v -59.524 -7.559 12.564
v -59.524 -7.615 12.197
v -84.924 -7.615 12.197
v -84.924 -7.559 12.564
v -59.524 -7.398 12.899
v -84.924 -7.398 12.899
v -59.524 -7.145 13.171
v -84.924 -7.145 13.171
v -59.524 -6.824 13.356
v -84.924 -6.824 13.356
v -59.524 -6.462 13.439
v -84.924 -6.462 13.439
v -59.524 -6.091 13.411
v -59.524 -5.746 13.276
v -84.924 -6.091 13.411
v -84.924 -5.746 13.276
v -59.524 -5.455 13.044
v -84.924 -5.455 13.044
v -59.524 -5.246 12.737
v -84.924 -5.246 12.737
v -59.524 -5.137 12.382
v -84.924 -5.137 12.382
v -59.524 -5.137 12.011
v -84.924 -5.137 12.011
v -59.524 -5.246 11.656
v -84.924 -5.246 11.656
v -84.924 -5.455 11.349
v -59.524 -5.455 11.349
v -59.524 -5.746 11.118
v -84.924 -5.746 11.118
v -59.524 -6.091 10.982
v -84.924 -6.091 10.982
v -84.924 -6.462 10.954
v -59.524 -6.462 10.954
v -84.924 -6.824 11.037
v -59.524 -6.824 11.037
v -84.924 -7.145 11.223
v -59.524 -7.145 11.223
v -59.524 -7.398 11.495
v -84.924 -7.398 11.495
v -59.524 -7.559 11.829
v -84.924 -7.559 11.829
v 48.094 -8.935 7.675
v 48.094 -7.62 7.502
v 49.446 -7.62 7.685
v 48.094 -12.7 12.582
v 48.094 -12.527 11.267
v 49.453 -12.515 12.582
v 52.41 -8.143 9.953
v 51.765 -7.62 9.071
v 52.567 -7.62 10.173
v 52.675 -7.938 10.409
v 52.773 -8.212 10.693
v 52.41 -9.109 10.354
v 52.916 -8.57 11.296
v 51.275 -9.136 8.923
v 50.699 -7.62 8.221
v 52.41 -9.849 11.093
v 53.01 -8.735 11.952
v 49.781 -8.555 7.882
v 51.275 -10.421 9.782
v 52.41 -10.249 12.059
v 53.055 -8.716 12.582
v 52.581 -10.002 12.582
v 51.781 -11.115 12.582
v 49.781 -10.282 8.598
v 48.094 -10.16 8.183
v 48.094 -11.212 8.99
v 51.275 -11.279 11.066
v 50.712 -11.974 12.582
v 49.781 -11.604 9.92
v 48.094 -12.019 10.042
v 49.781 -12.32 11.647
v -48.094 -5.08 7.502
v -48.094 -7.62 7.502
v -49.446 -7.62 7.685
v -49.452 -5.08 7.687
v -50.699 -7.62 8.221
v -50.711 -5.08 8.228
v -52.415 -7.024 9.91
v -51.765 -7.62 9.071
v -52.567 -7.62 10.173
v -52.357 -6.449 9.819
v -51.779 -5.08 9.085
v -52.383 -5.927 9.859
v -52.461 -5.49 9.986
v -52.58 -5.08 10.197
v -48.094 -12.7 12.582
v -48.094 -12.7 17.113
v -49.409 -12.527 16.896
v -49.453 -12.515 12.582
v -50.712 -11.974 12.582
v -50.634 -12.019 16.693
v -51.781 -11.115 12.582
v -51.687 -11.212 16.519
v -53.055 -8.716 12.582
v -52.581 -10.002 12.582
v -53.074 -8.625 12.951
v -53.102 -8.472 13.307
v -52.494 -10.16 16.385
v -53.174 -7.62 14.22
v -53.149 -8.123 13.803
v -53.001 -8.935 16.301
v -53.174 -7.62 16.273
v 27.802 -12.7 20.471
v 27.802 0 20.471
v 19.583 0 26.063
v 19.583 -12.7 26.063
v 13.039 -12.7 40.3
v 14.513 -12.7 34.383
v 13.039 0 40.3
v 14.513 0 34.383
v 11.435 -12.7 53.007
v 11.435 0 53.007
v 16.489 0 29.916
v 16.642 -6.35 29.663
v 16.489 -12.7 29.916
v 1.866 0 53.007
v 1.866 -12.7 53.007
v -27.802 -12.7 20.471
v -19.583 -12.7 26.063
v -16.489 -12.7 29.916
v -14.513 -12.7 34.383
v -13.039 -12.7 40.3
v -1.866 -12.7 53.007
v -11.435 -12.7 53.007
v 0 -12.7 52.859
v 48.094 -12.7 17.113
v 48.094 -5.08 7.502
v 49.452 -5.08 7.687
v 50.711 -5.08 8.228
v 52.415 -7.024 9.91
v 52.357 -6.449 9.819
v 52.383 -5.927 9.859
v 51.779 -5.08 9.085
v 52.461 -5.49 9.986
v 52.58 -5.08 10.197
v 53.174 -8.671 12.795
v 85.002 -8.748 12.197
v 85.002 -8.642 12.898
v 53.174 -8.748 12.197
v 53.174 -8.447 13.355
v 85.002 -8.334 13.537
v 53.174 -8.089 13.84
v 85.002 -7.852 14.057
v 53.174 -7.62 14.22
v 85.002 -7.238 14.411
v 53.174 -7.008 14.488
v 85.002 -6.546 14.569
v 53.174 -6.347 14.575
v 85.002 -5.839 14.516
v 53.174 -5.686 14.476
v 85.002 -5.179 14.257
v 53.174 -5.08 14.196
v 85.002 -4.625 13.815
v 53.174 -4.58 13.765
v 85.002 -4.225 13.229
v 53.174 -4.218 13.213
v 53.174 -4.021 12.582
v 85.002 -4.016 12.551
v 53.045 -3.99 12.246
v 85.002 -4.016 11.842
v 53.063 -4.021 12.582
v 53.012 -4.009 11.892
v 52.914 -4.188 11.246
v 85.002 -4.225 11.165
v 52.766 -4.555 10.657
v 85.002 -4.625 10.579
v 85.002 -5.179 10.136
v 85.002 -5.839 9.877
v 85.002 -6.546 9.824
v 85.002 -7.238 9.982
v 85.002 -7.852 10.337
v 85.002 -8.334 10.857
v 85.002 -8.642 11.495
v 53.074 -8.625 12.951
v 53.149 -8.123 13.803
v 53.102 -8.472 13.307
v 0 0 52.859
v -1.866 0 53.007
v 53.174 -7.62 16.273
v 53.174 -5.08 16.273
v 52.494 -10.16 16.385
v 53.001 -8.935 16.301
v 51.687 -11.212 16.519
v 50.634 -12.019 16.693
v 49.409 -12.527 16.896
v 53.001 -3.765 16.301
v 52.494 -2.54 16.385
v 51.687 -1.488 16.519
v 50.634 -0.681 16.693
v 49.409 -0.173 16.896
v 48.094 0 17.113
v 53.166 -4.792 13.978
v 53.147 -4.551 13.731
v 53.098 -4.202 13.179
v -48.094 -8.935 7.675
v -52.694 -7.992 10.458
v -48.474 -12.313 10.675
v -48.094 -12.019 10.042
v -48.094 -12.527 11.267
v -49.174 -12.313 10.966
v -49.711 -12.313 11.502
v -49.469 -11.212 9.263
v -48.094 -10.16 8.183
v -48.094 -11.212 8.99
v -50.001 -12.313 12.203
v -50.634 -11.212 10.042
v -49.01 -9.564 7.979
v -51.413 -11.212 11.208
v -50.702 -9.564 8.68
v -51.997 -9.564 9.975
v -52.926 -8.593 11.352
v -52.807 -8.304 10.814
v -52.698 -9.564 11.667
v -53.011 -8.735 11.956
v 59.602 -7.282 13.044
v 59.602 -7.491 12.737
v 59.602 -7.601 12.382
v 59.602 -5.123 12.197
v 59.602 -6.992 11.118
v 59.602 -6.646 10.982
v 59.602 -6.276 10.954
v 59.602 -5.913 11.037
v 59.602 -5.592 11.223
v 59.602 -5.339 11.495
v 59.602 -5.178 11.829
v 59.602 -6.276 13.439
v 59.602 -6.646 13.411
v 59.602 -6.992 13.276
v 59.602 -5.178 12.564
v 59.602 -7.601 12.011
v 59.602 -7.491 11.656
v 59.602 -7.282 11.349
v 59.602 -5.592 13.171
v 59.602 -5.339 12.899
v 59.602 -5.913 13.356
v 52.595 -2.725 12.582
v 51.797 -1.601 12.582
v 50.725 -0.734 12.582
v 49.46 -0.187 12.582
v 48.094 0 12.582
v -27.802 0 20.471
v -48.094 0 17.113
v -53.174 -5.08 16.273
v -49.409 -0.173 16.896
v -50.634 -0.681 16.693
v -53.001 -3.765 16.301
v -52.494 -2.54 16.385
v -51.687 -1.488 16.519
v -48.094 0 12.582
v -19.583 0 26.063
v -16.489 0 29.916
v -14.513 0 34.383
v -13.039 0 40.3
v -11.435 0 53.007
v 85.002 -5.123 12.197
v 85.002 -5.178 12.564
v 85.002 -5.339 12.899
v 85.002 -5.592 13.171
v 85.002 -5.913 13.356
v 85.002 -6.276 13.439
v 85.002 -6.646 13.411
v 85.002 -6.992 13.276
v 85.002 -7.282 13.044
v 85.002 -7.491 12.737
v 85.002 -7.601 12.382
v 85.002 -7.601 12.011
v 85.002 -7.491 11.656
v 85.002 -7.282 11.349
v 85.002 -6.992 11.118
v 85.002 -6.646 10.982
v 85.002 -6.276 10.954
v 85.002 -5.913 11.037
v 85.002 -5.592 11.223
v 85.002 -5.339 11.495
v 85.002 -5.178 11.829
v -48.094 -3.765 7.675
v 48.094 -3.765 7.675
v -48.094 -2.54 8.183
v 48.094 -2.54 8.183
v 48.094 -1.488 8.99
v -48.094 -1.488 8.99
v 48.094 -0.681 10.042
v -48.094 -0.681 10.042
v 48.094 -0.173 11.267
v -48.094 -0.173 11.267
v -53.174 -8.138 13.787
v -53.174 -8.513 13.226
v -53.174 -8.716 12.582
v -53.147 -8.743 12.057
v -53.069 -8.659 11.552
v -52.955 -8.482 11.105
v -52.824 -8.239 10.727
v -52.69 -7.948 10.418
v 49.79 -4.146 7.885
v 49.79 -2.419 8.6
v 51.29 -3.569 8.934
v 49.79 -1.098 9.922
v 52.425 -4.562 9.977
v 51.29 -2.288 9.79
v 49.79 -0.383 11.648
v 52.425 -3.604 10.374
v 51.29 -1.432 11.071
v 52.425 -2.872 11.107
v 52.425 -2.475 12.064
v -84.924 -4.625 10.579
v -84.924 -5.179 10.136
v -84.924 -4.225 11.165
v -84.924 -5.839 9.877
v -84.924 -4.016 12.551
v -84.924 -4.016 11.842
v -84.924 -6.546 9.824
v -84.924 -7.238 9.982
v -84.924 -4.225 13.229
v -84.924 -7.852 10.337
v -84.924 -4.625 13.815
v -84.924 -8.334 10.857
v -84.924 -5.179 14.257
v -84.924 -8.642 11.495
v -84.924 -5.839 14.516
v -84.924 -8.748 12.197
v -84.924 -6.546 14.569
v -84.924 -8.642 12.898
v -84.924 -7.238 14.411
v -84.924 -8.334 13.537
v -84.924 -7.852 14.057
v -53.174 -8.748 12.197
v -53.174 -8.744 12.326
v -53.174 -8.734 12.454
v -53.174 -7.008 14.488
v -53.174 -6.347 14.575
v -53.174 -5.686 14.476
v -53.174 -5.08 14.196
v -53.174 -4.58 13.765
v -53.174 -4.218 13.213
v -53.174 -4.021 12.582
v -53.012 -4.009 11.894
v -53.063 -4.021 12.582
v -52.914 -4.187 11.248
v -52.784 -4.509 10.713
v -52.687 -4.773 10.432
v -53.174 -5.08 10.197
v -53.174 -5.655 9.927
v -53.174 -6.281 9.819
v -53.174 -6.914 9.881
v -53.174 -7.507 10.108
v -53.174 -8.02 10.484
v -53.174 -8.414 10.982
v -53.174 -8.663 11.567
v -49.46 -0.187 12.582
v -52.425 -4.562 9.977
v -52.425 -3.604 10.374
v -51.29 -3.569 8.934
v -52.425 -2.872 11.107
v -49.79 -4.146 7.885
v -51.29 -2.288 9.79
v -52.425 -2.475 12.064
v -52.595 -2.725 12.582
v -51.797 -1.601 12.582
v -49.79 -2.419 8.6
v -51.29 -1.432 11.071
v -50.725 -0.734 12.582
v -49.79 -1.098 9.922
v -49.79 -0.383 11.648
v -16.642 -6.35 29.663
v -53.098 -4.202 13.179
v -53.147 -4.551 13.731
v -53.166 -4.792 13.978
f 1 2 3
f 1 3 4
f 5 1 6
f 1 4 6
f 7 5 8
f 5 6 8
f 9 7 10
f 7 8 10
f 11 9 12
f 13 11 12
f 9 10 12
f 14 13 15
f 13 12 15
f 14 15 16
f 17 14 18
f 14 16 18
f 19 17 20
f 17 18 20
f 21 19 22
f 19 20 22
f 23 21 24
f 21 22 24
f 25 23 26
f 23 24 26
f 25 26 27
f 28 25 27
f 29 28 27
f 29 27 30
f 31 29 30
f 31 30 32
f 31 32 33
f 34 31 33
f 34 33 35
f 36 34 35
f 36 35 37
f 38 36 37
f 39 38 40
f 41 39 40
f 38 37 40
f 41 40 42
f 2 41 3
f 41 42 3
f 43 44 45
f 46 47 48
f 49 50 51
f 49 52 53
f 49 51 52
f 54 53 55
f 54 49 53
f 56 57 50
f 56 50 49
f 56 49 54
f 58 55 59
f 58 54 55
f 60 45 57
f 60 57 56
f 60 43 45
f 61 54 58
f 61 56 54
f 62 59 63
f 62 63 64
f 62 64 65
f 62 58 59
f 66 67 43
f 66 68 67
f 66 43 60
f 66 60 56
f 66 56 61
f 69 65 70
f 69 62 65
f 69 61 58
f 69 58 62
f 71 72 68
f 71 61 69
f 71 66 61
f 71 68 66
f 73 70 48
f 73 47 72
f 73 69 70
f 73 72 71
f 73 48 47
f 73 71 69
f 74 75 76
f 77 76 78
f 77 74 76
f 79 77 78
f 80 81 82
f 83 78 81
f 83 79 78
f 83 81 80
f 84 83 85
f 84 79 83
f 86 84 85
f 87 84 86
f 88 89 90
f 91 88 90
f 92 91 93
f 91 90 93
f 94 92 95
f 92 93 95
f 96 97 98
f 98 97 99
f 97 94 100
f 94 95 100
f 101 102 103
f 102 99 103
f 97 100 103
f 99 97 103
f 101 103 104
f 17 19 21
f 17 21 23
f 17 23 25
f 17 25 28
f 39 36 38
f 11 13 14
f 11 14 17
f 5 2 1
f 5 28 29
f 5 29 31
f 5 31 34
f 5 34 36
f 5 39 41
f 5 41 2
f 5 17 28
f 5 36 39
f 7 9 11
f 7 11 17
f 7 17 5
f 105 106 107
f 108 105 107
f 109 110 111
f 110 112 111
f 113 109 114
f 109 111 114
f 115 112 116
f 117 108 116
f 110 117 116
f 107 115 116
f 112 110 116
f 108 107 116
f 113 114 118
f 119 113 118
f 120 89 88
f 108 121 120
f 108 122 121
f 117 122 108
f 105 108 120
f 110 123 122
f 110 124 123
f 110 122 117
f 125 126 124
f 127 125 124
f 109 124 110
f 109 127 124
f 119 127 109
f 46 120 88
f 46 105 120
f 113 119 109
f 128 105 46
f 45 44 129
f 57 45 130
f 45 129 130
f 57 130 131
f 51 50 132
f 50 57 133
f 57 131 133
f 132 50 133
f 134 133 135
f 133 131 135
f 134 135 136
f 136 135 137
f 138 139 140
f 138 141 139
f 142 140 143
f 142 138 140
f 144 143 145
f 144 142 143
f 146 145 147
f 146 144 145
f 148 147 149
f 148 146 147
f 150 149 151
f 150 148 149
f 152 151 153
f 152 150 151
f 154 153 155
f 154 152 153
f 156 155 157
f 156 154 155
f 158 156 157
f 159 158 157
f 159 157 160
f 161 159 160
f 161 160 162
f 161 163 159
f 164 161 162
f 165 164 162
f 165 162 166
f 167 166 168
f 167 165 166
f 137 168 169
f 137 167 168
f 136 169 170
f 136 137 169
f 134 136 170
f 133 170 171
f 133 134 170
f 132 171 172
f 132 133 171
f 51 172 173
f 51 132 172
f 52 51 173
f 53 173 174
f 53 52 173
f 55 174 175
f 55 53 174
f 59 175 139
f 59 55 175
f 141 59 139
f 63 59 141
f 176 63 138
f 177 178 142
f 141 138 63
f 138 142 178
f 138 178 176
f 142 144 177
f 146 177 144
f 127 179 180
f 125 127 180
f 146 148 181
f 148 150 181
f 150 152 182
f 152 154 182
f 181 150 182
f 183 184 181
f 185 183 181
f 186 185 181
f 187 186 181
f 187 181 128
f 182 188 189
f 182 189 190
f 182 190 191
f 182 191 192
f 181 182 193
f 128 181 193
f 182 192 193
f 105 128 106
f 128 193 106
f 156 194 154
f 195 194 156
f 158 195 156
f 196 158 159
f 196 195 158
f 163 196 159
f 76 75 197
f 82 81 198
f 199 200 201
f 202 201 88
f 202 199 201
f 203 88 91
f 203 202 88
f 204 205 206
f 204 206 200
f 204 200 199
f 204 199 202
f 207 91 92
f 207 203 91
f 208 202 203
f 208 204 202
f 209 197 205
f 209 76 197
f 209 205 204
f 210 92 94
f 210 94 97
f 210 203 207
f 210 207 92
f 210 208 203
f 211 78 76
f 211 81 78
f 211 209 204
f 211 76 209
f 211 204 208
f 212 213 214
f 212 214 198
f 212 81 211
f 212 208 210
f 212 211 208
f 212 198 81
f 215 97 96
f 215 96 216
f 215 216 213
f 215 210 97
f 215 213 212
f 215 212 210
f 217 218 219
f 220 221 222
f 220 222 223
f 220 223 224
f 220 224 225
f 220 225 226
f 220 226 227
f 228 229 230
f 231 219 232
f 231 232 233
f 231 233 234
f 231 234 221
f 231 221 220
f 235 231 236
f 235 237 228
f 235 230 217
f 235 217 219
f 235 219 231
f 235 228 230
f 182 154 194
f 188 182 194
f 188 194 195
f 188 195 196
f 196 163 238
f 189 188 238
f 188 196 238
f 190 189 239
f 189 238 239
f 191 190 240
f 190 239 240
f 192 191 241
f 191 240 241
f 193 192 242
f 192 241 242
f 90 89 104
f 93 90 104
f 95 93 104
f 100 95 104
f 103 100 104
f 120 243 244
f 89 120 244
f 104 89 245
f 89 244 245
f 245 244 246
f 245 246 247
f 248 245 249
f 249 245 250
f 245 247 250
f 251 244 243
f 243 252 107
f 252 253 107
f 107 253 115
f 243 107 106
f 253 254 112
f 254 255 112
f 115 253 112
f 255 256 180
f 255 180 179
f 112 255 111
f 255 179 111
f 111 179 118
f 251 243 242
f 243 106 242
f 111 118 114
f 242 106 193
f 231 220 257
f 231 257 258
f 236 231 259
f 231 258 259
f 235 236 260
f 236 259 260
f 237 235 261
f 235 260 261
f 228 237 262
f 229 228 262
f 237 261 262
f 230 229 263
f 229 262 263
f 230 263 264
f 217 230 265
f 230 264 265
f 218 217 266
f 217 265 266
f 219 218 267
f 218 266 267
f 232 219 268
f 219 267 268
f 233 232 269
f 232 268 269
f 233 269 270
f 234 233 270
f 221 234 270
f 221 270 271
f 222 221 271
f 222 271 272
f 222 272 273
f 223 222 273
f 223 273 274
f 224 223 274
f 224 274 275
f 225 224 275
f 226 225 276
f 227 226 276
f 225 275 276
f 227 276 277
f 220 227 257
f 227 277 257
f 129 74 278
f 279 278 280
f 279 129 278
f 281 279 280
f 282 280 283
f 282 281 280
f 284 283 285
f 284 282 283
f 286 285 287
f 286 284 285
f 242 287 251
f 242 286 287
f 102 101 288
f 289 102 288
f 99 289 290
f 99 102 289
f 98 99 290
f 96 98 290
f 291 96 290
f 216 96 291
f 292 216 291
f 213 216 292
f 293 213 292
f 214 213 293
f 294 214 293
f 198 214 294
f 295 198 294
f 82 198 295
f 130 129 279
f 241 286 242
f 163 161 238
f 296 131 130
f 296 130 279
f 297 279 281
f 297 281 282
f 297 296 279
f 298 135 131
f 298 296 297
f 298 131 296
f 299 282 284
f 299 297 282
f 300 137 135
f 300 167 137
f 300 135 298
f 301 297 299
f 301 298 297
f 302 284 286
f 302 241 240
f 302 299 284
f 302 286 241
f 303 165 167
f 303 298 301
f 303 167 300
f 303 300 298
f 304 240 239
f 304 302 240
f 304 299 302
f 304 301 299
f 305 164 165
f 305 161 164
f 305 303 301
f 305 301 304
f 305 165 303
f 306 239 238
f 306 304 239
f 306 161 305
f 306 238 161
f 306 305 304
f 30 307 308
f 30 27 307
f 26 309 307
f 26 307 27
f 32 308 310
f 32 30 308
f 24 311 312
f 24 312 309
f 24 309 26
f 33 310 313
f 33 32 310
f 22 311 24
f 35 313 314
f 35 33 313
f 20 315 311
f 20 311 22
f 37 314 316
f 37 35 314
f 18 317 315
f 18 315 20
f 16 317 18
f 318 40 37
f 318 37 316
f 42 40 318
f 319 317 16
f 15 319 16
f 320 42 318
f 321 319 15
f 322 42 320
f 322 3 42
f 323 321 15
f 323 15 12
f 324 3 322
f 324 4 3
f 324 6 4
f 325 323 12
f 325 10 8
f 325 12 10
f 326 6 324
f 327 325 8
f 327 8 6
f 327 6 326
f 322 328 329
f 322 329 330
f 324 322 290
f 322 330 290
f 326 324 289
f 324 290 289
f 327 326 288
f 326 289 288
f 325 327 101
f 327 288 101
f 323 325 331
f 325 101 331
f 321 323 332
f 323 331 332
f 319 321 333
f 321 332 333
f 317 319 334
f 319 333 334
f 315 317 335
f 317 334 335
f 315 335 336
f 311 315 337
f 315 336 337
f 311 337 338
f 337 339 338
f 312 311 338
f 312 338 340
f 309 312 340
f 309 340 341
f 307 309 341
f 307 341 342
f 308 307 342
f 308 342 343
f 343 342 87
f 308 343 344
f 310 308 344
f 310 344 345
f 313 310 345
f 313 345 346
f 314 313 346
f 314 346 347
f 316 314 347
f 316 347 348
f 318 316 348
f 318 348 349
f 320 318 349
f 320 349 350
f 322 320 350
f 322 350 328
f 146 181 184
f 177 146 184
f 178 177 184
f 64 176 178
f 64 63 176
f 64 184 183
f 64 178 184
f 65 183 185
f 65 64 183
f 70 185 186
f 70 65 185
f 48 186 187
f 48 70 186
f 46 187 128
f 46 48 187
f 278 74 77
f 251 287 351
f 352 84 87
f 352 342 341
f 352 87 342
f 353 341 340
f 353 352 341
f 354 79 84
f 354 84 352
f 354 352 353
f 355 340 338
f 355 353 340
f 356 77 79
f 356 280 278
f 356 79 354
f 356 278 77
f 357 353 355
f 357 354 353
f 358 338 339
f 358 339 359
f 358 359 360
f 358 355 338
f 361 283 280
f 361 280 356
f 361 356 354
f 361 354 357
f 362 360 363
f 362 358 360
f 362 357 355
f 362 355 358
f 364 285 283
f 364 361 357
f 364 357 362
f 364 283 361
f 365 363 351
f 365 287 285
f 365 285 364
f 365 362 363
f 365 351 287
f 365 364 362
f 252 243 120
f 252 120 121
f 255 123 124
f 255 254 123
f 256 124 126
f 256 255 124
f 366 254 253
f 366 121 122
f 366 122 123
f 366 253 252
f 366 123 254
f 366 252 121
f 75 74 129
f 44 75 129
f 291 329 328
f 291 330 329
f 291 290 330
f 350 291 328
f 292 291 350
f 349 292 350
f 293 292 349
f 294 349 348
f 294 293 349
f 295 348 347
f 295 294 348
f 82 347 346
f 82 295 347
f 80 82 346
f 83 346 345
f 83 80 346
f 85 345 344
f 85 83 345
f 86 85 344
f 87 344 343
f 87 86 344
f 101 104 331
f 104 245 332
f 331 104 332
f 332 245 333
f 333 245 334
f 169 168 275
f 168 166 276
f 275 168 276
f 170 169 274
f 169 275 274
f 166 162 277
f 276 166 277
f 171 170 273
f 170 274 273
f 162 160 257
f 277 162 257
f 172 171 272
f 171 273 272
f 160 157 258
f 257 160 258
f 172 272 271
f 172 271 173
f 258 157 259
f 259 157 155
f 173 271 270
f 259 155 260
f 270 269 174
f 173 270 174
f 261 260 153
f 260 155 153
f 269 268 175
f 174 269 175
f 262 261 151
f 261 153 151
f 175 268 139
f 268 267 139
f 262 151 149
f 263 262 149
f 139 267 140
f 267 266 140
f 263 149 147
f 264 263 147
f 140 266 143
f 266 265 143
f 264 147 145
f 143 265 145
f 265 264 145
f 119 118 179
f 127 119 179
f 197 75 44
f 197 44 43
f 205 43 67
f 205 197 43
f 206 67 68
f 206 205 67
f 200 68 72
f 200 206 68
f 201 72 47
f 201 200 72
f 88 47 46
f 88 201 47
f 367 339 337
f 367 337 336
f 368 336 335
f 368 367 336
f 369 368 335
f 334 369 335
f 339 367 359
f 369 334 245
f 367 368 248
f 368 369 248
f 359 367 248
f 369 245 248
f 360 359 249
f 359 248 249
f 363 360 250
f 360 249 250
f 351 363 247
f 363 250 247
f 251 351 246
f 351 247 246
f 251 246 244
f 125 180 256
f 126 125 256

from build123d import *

# Parameters (mm, degrees)
F1_DEPTH      = 12.7
F2_R          = 2.3789042868
F3_DEPTH      = 31.75
F3_DEPTH_BACK = 138.176
F4_R          = 5.08
F5_T4_ANGLE   = 90
F5_S5_R       = 2.3789042868
F5_T6_DEPTH   = 6
F5_T10_DEPTH  = 20.32
F5_S11_R      = 2.3789042868
F5_T12_DEPTH  = 12
F5_T16_DEPTH  = 16.390593442
F5_S17_R      = 2.3789042868
F5_T18_DEPTH  = 10
F6_T1_DEPTH   = 113.968887086
F6_T6_ANGLE   = 90.0000000017
F6_S7_R       = 2.3789042868
F6_T8_DEPTH   = 6
F6_T12_DEPTH  = 16.390593442
F6_S13_R      = 2.3789042868
F6_T14_DEPTH  = 10
F7_R          = 1.2458673334
F8_DEPTH      = 25.4
F9_T4_DEPTH   = 16.390593442
F9_S5_R       = 2.3789042868
F9_T6_DEPTH   = 10
F9_T10_DEPTH  = 16.390593442
F9_S11_R      = 2.3789042868
F9_T12_DEPTH  = 10
F9_T16_ANGLE  = 90
F9_S17_R      = 2.3789042868
F9_T18_DEPTH  = 6
F9_T22_DEPTH  = 2.54
F9_S23_R      = 2.3789042868
F9_T24_DEPTH  = 5
F9_T28_ANGLE  = 90.0000000017
F9_S29_R      = 2.3789042868
F9_T30_DEPTH  = 6
F10_R         = 1.24587
F11_DEPTH     = 25.4


# Not quite as in the source:
# - a fillet or chamfer that OpenCascade refuses, or shapes differently, is made with other operations: its cross-section is extruded or revolved along the edge and cut away or added


with BuildPart() as f1:
    # F0 (on Front) → F1 (new body)
    with BuildSketch(Plane.XZ):
        with BuildLine():
            Line((-53.174443543, 7.5021637604), (0, 7.5021637604))
            Line((0, 7.5021637604), (53.174443543, 7.5021637604))
            Line((53.174443543, 7.5021637604), (53.174443543, 16.2727572024))
            Line((53.174443543, 16.2727572024), (27.8020980501, 20.4710588867))
            add(Edge.make_bspline(
                [(27.8020980501, 20.4710588867), (23.5634737704, 22.8817989501), (13.8731335003, 28.3932314282), (12.3127368707, 44.1452356637), (11.4348689094, 53.0072003603)],
                knots=[0, 0, 0, 0, 0.4374071665, 1, 1, 1, 1], degree=3))
            Line((11.4348689094, 53.0072003603), (1.8664607778, 53.0072003603))
            Line((1.8664607778, 53.0072003603), (0, 52.8586618602))
            Line((0, 52.8586618602), (-1.8664607778, 53.0072003603))
            Line((-1.8664607778, 53.0072003603), (-11.4348689094, 53.0072003603))
            add(Edge.make_bspline(
                [(-27.8020980501, 20.4710588867), (-23.5634737704, 22.8817989501), (-13.8731335003, 28.3932314282), (-12.3127368707, 44.1452356637), (-11.4348689094, 53.0072003603)],
                knots=[0, 0, 0, 0, 0.4374071665, 1, 1, 1, 1], degree=3))
            Line((-27.8020980501, 20.4710588867), (-53.174443543, 16.2727572024))
            Line((-53.174443543, 16.2727572024), (-53.174443543, 7.5021637604))
        make_face()
    extrude(amount=F1_DEPTH)

    # F2 (on face) → F3 (join, two sides)
    with BuildSketch(Plane(origin=(-53.174443543, 0, 0), x_dir=(0, -1, 0), z_dir=(-1, 0, 0))) as f3_sk:
        with Locations((6.3686654903, 12.1966870502)):
            Circle(F2_R)
    extrude(amount=F3_DEPTH)
    extrude(f3_sk.sketch, amount=-F3_DEPTH_BACK)

    # F4
    f4_edges = [f1.edges().sort_by_distance(p)[0] for p in [
        (0, 0, 7.502164),
    ]]
    fillet(f4_edges, radius=F4_R)

    # F5: fillet of radius 5.08 on 1 edges, made by hand


with BuildPart() as f5_tool2:
    # F5_s3 → F5_t4 (revolve)
    with BuildSketch(Plane.XZ.offset(5.08)):
        with BuildLine():
            ThreePointArc((-53.174443543, 12.5821637604), (-51.6865459914, 8.9900613119), (-48.094443543, 7.5021637604))
            Line((-48.094443543, 7.5021637604), (-53.174443543, 7.5021637604))
            Line((-53.174443543, 7.5021637604), (-53.174443543, 12.5821637604))
        make_face()
    revolve(axis=Axis((-53.174443543, -5.08, 12.5821637604), (1, 0, 0)), revolution_arc=F5_T4_ANGLE)

    # F5_s5 → F5_t6 (cut, symmetric)
    with BuildSketch(Plane.YZ.offset(-50.6)):
        with Locations((-6.3686654903, 12.1966870502)):
            Circle(F5_S5_R)
    extrude(amount=F5_T6_DEPTH, both=True, mode=Mode.SUBTRACT)


with BuildPart() as f1_1:
    add(f1.part)

    # F5_t1: cut F5_tool2
    add(f5_tool2.part, mode=Mode.SUBTRACT)


with BuildPart() as f5_tool8:
    # F5_s9 → F5_t10 (new body)
    with BuildSketch(Plane.XZ.offset(5.08)):
        with BuildLine():
            ThreePointArc((-48.094443543, 7.5021637604), (-51.6865459914, 8.9900613119), (-53.174443543, 12.5821637604))
            Line((-53.174443543, 12.5821637604), (-53.174443543, 7.5021637604))
            Line((-53.174443543, 7.5021637604), (-48.094443543, 7.5021637604))
        make_face()
    extrude(amount=F5_T10_DEPTH)

    # F5_s11 → F5_t12 (cut, symmetric)
    with BuildSketch(Plane.YZ.offset(-50.6)):
        with Locations((-6.3686654903, 12.1966870502)):
            Circle(F5_S11_R)
    extrude(amount=F5_T12_DEPTH, both=True, mode=Mode.SUBTRACT)


with BuildPart() as f1_2:
    add(f1_1.part)

    # F5_t7: cut F5_tool8
    add(f5_tool8.part, mode=Mode.SUBTRACT)


with BuildPart() as f5_tool14:
    # F5_s15 → F5_t16 (new body)
    with BuildSketch(Plane.XY.offset(28.9727572024)):
        with BuildLine():
            ThreePointArc((-53.174443543, -5.08), (-51.6865459914, -1.4878975516), (-48.094443543, 0))
            Line((-48.094443543, 0), (-53.174443543, 0))
            Line((-53.174443543, 0), (-53.174443543, -5.08))
        make_face()
    extrude(amount=-F5_T16_DEPTH)

    # F5_s17 → F5_t18 (cut, symmetric)
    with BuildSketch(Plane.YZ.offset(-50.6)):
        with Locations((-6.3686654903, 12.1966870502)):
            Circle(F5_S17_R)
    extrude(amount=F5_T18_DEPTH, both=True, mode=Mode.SUBTRACT)


with BuildPart() as f1_3:
    add(f1_2.part)

    # F5_t13: cut F5_tool14
    add(f5_tool14.part, mode=Mode.SUBTRACT)

    # F6: fillet of radius 5.08 on 1 edges, made by hand

    # F6_s2 → F6_t1 (cut)
    with BuildSketch(Plane.YZ.offset(-48.094443543)):
        with BuildLine():
            ThreePointArc((-7.62, 7.5021637604), (-11.2121024484, 8.9900613119), (-12.7, 12.5821637604))
            Line((-12.7, 12.5821637604), (-12.7, 7.5021637604))
            Line((-12.7, 7.5021637604), (-7.62, 7.5021637604))
        make_face()
    extrude(amount=F6_T1_DEPTH, mode=Mode.SUBTRACT)


with BuildPart() as f6_tool4:
    # F6_s5 → F6_t6 (revolve)
    with BuildSketch(Plane.YZ.offset(-48.0944435431)):
        with BuildLine():
            ThreePointArc((-12.7, 12.5821637604), (-11.2121024484, 8.990061312), (-7.62, 7.5021637604))
            Line((-7.62, 7.5021637604), (-12.7, 7.5021637604))
            Line((-12.7, 7.5021637604), (-12.7, 12.5821637604))
        make_face()
    revolve(axis=Axis((-48.0944435431, -12.7, 12.5821637603), (0, 1, 0)), revolution_arc=F6_T6_ANGLE)

    # F6_s7 → F6_t8 (cut, symmetric)
    with BuildSketch(Plane.YZ.offset(-50.6)):
        with Locations((-6.3686654903, 12.1966870502)):
            Circle(F6_S7_R)
    extrude(amount=F6_T8_DEPTH, both=True, mode=Mode.SUBTRACT)


with BuildPart() as f1_4:
    add(f1_3.part)

    # F6_t3: cut F6_tool4
    add(f6_tool4.part, mode=Mode.SUBTRACT)


with BuildPart() as f6_tool10:
    # F6_s11 → F6_t12 (new body)
    with BuildSketch(Plane.XY.offset(28.9727572024)):
        with BuildLine():
            ThreePointArc((-48.094443543, -12.7), (-51.6865459914, -11.2121024484), (-53.174443543, -7.62))
            Line((-53.174443543, -7.62), (-53.174443543, -12.7))
            Line((-53.174443543, -12.7), (-48.094443543, -12.7))
        make_face()
    extrude(amount=-F6_T12_DEPTH)

    # F6_s13 → F6_t14 (cut, symmetric)
    with BuildSketch(Plane.YZ.offset(-50.6)):
        with Locations((-6.3686654903, 12.1966870502)):
            Circle(F6_S13_R)
    extrude(amount=F6_T14_DEPTH, both=True, mode=Mode.SUBTRACT)


with BuildPart() as f1_5:
    add(f1_4.part)

    # F6_t9: cut F6_tool10
    add(f6_tool10.part, mode=Mode.SUBTRACT)

    # F7 (on face) → F8 (cut)
    with BuildSketch(Plane(origin=(-84.924443543, 0, 0), x_dir=(0, -1, 0), z_dir=(-1, 0, 0))):
        with Locations((6.3686654903, 12.1966870502)):
            Circle(F7_R)
    extrude(amount=-F8_DEPTH, mode=Mode.SUBTRACT)

    # F9: fillet of radius 5.08 on 2 edges, made by hand


with BuildPart() as f9_tool2:
    # F9_s3 → F9_t4 (new body)
    with BuildSketch(Plane.XY.offset(12.5821637604)):
        with BuildLine():
            ThreePointArc((53.174443543, -7.62), (51.6865459914, -11.2121024484), (48.094443543, -12.7))
            Line((48.094443543, -12.7), (53.174443543, -12.7))
            Line((53.174443543, -12.7), (53.174443543, -7.62))
        make_face()
    extrude(amount=F9_T4_DEPTH)

    # F9_s5 → F9_t6 (cut, symmetric)
    with BuildSketch(Plane.YZ.offset(50.6)):
        with Locations((-6.3686654903, 12.1966870502)):
            Circle(F9_S5_R)
    extrude(amount=F9_T6_DEPTH, both=True, mode=Mode.SUBTRACT)


with BuildPart() as f1_6:
    add(f1_5.part)

    # F9_t1: cut F9_tool2
    add(f9_tool2.part, mode=Mode.SUBTRACT)


with BuildPart() as f9_tool8:
    # F9_s9 → F9_t10 (new body)
    with BuildSketch(Plane.XY.offset(12.5821637604)):
        with BuildLine():
            ThreePointArc((53.174443543, -5.08), (51.6865459914, -1.4878975516), (48.094443543, 0))
            Line((48.094443543, 0), (53.174443543, 0))
            Line((53.174443543, 0), (53.174443543, -5.08))
        make_face()
    extrude(amount=F9_T10_DEPTH)

    # F9_s11 → F9_t12 (cut, symmetric)
    with BuildSketch(Plane.YZ.offset(50.6)):
        with Locations((-6.3686654903, 12.1966870502)):
            Circle(F9_S11_R)
    extrude(amount=F9_T12_DEPTH, both=True, mode=Mode.SUBTRACT)


with BuildPart() as f1_7:
    add(f1_6.part)

    # F9_t7: cut F9_tool8
    add(f9_tool8.part, mode=Mode.SUBTRACT)


with BuildPart() as f9_tool14:
    # F9_s15 → F9_t16 (revolve)
    with BuildSketch(Plane.XZ.offset(5.08)):
        with BuildLine():
            ThreePointArc((48.094443543, 7.5021637604), (51.6865459914, 8.9900613119), (53.174443543, 12.5821637604))
            Line((53.174443543, 12.5821637604), (53.174443543, 7.5021637604))
            Line((53.174443543, 7.5021637604), (48.094443543, 7.5021637604))
        make_face()
    revolve(axis=Axis((53.174443543, -5.08, 12.5821637604), (1, 0, 0)), revolution_arc=F9_T16_ANGLE)

    # F9_s17 → F9_t18 (cut, symmetric)
    with BuildSketch(Plane.YZ.offset(50.6)):
        with Locations((-6.3686654903, 12.1966870502)):
            Circle(F9_S17_R)
    extrude(amount=F9_T18_DEPTH, both=True, mode=Mode.SUBTRACT)


with BuildPart() as f1_8:
    add(f1_7.part)

    # F9_t13: cut F9_tool14
    add(f9_tool14.part, mode=Mode.SUBTRACT)


with BuildPart() as f9_tool20:
    # F9_s21 → F9_t22 (new body)
    with BuildSketch(Plane.XZ.offset(5.08)):
        with BuildLine():
            ThreePointArc((48.094443543, 7.5021637604), (51.6865459914, 8.9900613119), (53.174443543, 12.5821637604))
            Line((53.174443543, 12.5821637604), (53.174443543, 7.5021637604))
            Line((53.174443543, 7.5021637604), (48.094443543, 7.5021637604))
        make_face()
    extrude(amount=F9_T22_DEPTH)

    # F9_s23 → F9_t24 (cut, symmetric)
    with BuildSketch(Plane.YZ.offset(50.6)):
        with Locations((-6.3686654903, 12.1966870502)):
            Circle(F9_S23_R)
    extrude(amount=F9_T24_DEPTH, both=True, mode=Mode.SUBTRACT)


with BuildPart() as f1_9:
    add(f1_8.part)

    # F9_t19: cut F9_tool20
    add(f9_tool20.part, mode=Mode.SUBTRACT)


with BuildPart() as f9_tool26:
    # F9_s27 → F9_t28 (revolve)
    with BuildSketch(Plane.XZ.offset(7.6200000001)):
        with BuildLine():
            ThreePointArc((53.174443543, 12.5821637604), (51.6865459914, 8.990061312), (48.094443543, 7.5021637604))
            Line((48.094443543, 7.5021637604), (53.174443543, 7.5021637604))
            Line((53.174443543, 7.5021637604), (53.174443543, 12.5821637604))
        make_face()
    revolve(axis=Axis((53.174443543, -7.6200000001, 12.5821637603), (-1, 0, 0)), revolution_arc=F9_T28_ANGLE)

    # F9_s29 → F9_t30 (cut, symmetric)
    with BuildSketch(Plane.YZ.offset(50.6)):
        with Locations((-6.3686654903, 12.1966870502)):
            Circle(F9_S29_R)
    extrude(amount=F9_T30_DEPTH, both=True, mode=Mode.SUBTRACT)


with BuildPart() as f1_10:
    add(f1_9.part)

    # F9_t25: cut F9_tool26
    add(f9_tool26.part, mode=Mode.SUBTRACT)

    # F10 (on face) → F11 (cut)
    with BuildSketch(Plane.YZ.offset(85.001556457)):
        with Locations((-6.3686654903, 12.1966870502)):
            Circle(F10_R)
    extrude(amount=-F11_DEPTH, mode=Mode.SUBTRACT)


solid = f1_10.part
